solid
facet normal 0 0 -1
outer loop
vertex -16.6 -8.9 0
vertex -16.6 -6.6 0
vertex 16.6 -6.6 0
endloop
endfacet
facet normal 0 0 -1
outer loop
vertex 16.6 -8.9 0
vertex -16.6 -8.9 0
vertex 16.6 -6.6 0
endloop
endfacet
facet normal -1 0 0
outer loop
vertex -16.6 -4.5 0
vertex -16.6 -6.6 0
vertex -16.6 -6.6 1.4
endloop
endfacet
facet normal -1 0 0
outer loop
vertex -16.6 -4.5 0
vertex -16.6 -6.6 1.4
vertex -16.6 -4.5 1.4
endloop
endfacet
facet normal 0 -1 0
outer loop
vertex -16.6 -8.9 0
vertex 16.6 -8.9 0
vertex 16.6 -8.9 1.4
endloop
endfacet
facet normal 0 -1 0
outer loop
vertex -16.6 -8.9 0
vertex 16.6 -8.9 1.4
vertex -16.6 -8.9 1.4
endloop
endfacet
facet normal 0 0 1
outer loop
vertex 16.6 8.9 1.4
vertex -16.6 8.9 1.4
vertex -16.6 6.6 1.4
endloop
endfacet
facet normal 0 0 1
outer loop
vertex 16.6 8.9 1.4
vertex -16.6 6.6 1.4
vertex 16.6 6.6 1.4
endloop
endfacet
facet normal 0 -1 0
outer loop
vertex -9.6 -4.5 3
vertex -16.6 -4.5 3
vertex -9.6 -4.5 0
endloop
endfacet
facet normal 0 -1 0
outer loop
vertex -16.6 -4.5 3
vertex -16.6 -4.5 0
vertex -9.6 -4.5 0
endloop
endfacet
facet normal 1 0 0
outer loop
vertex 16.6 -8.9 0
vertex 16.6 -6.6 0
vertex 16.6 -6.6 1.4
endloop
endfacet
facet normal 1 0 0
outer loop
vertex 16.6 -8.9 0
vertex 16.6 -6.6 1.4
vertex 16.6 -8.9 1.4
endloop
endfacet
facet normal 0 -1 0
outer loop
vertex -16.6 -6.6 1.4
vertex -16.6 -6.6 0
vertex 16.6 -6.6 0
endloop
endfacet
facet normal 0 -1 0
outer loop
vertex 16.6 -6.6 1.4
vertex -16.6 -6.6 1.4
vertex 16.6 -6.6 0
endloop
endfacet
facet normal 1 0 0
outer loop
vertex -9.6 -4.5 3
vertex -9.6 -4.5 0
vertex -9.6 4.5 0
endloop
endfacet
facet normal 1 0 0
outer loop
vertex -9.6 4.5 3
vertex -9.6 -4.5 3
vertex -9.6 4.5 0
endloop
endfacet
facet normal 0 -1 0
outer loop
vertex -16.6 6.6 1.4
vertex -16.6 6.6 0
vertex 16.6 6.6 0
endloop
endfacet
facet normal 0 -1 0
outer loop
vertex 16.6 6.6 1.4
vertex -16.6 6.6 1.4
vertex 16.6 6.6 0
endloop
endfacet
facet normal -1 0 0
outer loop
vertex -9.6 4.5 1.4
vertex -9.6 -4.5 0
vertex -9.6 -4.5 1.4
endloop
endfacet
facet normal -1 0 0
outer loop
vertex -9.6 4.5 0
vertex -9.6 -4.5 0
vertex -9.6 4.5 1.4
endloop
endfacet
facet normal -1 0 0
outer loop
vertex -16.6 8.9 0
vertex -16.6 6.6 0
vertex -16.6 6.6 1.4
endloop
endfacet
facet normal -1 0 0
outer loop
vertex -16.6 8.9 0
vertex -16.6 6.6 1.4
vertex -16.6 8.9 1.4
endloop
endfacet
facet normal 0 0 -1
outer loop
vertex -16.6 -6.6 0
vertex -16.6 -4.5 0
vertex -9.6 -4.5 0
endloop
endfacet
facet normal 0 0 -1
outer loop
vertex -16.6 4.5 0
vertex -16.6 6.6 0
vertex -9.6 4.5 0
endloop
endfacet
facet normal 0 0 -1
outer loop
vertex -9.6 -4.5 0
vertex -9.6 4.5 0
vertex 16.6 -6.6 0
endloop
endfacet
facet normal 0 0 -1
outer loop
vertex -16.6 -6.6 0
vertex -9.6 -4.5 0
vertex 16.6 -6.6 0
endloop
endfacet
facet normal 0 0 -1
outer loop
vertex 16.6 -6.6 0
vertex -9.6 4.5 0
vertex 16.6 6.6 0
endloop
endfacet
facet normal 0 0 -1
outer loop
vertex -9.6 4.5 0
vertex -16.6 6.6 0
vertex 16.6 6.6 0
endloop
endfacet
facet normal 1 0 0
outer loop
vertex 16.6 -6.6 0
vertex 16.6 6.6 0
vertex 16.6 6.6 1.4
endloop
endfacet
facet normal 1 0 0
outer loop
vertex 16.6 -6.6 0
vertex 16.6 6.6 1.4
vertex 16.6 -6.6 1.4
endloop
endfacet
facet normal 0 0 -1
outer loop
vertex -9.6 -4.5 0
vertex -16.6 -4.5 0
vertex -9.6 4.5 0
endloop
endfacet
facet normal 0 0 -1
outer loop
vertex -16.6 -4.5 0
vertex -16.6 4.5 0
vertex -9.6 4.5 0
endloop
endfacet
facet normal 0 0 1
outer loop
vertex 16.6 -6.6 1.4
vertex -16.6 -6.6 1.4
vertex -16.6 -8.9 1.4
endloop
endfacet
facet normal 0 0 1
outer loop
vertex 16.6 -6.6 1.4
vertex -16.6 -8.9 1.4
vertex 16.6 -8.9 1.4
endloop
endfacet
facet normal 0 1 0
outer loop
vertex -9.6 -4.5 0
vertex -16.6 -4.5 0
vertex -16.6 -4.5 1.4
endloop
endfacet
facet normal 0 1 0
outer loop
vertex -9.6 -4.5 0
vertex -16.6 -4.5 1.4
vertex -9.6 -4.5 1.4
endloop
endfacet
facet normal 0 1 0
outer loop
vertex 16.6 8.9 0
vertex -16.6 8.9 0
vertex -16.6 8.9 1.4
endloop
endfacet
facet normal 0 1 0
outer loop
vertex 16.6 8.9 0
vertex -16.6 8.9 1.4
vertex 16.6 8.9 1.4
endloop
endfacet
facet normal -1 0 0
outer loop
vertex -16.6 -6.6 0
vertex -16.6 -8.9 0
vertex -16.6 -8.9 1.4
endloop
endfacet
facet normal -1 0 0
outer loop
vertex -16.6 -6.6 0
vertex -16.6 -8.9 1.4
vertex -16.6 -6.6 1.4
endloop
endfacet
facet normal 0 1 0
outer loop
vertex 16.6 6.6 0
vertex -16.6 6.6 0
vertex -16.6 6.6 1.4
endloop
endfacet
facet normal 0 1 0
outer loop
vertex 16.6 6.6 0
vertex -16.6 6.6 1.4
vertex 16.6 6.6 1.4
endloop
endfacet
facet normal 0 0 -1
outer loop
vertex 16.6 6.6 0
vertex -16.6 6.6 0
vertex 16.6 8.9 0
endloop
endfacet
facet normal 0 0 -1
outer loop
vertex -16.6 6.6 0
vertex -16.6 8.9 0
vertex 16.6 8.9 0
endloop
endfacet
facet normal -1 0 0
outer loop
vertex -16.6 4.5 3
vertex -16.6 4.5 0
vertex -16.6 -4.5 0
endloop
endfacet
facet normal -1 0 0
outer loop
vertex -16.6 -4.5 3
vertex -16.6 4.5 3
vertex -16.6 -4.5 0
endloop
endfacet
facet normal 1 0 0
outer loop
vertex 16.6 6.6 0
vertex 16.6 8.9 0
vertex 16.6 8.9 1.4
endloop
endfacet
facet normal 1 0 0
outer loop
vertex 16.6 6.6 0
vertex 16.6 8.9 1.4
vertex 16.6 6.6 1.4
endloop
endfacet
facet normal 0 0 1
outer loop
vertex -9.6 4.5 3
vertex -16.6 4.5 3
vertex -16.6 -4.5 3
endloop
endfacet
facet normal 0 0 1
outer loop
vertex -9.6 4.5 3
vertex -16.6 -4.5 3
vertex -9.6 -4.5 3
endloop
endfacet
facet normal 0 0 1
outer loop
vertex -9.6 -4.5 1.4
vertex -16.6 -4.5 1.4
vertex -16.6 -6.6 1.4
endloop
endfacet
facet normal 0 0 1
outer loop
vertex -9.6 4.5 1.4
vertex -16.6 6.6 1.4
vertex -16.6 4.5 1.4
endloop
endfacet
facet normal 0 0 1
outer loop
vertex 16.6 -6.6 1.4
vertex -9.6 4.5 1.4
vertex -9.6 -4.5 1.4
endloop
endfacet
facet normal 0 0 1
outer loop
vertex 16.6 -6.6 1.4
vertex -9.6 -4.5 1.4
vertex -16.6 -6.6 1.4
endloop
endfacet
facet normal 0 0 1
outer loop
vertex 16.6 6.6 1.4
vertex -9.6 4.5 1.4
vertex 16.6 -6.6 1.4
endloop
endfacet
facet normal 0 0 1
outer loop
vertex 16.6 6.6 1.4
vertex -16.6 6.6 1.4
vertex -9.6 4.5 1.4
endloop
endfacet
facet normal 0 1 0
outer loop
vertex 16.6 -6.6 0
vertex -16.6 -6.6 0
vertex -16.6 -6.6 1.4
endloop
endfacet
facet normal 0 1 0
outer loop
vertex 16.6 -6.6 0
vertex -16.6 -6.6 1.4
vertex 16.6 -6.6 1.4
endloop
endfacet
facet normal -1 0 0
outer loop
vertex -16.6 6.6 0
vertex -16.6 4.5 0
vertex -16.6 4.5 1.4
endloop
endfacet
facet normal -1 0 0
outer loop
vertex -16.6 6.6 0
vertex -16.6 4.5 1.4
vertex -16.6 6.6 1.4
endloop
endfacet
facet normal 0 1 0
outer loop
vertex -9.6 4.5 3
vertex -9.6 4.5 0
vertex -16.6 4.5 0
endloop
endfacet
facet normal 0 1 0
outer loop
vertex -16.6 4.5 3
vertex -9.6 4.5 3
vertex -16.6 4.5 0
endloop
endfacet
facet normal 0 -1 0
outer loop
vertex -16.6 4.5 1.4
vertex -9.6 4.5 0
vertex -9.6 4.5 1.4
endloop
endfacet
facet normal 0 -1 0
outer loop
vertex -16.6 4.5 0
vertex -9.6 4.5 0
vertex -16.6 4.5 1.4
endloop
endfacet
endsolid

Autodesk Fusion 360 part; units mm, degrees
sketch "pcb" plane through (0, 0, 0) normal (0, 0, 1) x (1, 0, 0)
  line L0 (16.6, -8.9) -> (-16.6, -8.9)
  line L1 (-16.6, -8.9) -> (-16.6, 8.9)
  line L2 (-16.6, 8.9) -> (16.6, 8.9)
  line L3 (16.6, 8.9) -> (16.6, -8.9)
  line L4 (16.6, -8.9) -> (-16.6, 8.9) construction
  line L5 (-16.6, -8.9) -> (16.6, 8.9) construction
  line L6 (-16.6, -6.6) -> (16.6, -6.6)
  line L7 (-16.6, 6.6) -> (16.6, 6.6)
  dimension "d7" = 33.2
  dimension "d8" = 17.8
  dimension "d18" = 2.3
  dimension "d20" = 2.3
extrude "Extrude1" add sketch "pcb" along normal blind 1.4 makes body 1
sketch "usb" plane through (0, 0, 0) normal (0, 0, 1) x (1, 0, 0)
  line L0 (-16.6, -4.5) -> (-9.6, -4.5)
  line L1 (-9.6, -4.5) -> (-9.6, 4.5)
  line L2 (-9.6, 4.5) -> (-16.6, 4.5)
  line L3 (-16.6, 4.5) -> (-16.6, -4.5)
  line L4 (-16.6, 8.9) -> (-16.6, -8.9)
  dimension "d11" = 7
  dimension "d12" = 9
  dimension "d13" = 4.4
extrude "Extrude2" cut sketch "usb" along normal blind 3 bodies 1
extrude "Extrude3" add sketch "usb" along normal blind 3 separate body makes body 2
extrude "Extrude4" add sketch "pcb" along normal blind 1.4 separate body contours L0 L1 L3 L6 makes body 3
extrude "Extrude5" cut sketch "pcb" along normal blind 1.4 contours L1 L2 L3 L7 bodies 1
extrude "Extrude6" add sketch "pcb" along normal blind 1.4 separate body contours L1 L2 L3 L7 makes body 4
extrude "Extrude7" cut sketch "pcb" along normal blind 1.4 contours L0 L1 L3 L6 bodies 1
copy_body "Body->Comp1" bodies 1 removing the originals makes body 5 in component "nice!nano v1.0"
copy_body "CutPasteBodies4" bodies 2 removing the originals makes body 6 in component "nice!nano v1.0"
copy_body "CutPasteBodies5" bodies 4 removing the originals makes body 7 in component "nice!nano v1.0"
copy_body "CutPasteBodies6" bodies 3 removing the originals makes body 8 in component "nice!nano v1.0"
component "nice!nano v1.0" placed x (1, 0, 0) y (0, 1, 0) z (0, 0, 1) at (0, 0, 0)
equation "length = 33.2 mm"
equation "width = 17.8 mm"
equation "height = 1.4 mm"
equation "usbWidth = 9 mm"
equation "usbHeight = 3 mm"
equation "usbDepth = 7 mm"
equation "d7 = length"
equation "d8 = width"
equation "d9 = height"
equation "d11 = usbDepth"
equation "d12 = usbWidth"
equation "d13 = ( width - usbWidth ) / 2"
equation "d14 = usbHeight"
equation "d16 = usbHeight"
equation "d18 = headerWidth"
equation "headerWidth = 2.3 mm"
equation "d20 = headerWidth"
equation "d21 = height"
equation "d23 = height"
equation "d25 = height"
equation "d27 = height"
